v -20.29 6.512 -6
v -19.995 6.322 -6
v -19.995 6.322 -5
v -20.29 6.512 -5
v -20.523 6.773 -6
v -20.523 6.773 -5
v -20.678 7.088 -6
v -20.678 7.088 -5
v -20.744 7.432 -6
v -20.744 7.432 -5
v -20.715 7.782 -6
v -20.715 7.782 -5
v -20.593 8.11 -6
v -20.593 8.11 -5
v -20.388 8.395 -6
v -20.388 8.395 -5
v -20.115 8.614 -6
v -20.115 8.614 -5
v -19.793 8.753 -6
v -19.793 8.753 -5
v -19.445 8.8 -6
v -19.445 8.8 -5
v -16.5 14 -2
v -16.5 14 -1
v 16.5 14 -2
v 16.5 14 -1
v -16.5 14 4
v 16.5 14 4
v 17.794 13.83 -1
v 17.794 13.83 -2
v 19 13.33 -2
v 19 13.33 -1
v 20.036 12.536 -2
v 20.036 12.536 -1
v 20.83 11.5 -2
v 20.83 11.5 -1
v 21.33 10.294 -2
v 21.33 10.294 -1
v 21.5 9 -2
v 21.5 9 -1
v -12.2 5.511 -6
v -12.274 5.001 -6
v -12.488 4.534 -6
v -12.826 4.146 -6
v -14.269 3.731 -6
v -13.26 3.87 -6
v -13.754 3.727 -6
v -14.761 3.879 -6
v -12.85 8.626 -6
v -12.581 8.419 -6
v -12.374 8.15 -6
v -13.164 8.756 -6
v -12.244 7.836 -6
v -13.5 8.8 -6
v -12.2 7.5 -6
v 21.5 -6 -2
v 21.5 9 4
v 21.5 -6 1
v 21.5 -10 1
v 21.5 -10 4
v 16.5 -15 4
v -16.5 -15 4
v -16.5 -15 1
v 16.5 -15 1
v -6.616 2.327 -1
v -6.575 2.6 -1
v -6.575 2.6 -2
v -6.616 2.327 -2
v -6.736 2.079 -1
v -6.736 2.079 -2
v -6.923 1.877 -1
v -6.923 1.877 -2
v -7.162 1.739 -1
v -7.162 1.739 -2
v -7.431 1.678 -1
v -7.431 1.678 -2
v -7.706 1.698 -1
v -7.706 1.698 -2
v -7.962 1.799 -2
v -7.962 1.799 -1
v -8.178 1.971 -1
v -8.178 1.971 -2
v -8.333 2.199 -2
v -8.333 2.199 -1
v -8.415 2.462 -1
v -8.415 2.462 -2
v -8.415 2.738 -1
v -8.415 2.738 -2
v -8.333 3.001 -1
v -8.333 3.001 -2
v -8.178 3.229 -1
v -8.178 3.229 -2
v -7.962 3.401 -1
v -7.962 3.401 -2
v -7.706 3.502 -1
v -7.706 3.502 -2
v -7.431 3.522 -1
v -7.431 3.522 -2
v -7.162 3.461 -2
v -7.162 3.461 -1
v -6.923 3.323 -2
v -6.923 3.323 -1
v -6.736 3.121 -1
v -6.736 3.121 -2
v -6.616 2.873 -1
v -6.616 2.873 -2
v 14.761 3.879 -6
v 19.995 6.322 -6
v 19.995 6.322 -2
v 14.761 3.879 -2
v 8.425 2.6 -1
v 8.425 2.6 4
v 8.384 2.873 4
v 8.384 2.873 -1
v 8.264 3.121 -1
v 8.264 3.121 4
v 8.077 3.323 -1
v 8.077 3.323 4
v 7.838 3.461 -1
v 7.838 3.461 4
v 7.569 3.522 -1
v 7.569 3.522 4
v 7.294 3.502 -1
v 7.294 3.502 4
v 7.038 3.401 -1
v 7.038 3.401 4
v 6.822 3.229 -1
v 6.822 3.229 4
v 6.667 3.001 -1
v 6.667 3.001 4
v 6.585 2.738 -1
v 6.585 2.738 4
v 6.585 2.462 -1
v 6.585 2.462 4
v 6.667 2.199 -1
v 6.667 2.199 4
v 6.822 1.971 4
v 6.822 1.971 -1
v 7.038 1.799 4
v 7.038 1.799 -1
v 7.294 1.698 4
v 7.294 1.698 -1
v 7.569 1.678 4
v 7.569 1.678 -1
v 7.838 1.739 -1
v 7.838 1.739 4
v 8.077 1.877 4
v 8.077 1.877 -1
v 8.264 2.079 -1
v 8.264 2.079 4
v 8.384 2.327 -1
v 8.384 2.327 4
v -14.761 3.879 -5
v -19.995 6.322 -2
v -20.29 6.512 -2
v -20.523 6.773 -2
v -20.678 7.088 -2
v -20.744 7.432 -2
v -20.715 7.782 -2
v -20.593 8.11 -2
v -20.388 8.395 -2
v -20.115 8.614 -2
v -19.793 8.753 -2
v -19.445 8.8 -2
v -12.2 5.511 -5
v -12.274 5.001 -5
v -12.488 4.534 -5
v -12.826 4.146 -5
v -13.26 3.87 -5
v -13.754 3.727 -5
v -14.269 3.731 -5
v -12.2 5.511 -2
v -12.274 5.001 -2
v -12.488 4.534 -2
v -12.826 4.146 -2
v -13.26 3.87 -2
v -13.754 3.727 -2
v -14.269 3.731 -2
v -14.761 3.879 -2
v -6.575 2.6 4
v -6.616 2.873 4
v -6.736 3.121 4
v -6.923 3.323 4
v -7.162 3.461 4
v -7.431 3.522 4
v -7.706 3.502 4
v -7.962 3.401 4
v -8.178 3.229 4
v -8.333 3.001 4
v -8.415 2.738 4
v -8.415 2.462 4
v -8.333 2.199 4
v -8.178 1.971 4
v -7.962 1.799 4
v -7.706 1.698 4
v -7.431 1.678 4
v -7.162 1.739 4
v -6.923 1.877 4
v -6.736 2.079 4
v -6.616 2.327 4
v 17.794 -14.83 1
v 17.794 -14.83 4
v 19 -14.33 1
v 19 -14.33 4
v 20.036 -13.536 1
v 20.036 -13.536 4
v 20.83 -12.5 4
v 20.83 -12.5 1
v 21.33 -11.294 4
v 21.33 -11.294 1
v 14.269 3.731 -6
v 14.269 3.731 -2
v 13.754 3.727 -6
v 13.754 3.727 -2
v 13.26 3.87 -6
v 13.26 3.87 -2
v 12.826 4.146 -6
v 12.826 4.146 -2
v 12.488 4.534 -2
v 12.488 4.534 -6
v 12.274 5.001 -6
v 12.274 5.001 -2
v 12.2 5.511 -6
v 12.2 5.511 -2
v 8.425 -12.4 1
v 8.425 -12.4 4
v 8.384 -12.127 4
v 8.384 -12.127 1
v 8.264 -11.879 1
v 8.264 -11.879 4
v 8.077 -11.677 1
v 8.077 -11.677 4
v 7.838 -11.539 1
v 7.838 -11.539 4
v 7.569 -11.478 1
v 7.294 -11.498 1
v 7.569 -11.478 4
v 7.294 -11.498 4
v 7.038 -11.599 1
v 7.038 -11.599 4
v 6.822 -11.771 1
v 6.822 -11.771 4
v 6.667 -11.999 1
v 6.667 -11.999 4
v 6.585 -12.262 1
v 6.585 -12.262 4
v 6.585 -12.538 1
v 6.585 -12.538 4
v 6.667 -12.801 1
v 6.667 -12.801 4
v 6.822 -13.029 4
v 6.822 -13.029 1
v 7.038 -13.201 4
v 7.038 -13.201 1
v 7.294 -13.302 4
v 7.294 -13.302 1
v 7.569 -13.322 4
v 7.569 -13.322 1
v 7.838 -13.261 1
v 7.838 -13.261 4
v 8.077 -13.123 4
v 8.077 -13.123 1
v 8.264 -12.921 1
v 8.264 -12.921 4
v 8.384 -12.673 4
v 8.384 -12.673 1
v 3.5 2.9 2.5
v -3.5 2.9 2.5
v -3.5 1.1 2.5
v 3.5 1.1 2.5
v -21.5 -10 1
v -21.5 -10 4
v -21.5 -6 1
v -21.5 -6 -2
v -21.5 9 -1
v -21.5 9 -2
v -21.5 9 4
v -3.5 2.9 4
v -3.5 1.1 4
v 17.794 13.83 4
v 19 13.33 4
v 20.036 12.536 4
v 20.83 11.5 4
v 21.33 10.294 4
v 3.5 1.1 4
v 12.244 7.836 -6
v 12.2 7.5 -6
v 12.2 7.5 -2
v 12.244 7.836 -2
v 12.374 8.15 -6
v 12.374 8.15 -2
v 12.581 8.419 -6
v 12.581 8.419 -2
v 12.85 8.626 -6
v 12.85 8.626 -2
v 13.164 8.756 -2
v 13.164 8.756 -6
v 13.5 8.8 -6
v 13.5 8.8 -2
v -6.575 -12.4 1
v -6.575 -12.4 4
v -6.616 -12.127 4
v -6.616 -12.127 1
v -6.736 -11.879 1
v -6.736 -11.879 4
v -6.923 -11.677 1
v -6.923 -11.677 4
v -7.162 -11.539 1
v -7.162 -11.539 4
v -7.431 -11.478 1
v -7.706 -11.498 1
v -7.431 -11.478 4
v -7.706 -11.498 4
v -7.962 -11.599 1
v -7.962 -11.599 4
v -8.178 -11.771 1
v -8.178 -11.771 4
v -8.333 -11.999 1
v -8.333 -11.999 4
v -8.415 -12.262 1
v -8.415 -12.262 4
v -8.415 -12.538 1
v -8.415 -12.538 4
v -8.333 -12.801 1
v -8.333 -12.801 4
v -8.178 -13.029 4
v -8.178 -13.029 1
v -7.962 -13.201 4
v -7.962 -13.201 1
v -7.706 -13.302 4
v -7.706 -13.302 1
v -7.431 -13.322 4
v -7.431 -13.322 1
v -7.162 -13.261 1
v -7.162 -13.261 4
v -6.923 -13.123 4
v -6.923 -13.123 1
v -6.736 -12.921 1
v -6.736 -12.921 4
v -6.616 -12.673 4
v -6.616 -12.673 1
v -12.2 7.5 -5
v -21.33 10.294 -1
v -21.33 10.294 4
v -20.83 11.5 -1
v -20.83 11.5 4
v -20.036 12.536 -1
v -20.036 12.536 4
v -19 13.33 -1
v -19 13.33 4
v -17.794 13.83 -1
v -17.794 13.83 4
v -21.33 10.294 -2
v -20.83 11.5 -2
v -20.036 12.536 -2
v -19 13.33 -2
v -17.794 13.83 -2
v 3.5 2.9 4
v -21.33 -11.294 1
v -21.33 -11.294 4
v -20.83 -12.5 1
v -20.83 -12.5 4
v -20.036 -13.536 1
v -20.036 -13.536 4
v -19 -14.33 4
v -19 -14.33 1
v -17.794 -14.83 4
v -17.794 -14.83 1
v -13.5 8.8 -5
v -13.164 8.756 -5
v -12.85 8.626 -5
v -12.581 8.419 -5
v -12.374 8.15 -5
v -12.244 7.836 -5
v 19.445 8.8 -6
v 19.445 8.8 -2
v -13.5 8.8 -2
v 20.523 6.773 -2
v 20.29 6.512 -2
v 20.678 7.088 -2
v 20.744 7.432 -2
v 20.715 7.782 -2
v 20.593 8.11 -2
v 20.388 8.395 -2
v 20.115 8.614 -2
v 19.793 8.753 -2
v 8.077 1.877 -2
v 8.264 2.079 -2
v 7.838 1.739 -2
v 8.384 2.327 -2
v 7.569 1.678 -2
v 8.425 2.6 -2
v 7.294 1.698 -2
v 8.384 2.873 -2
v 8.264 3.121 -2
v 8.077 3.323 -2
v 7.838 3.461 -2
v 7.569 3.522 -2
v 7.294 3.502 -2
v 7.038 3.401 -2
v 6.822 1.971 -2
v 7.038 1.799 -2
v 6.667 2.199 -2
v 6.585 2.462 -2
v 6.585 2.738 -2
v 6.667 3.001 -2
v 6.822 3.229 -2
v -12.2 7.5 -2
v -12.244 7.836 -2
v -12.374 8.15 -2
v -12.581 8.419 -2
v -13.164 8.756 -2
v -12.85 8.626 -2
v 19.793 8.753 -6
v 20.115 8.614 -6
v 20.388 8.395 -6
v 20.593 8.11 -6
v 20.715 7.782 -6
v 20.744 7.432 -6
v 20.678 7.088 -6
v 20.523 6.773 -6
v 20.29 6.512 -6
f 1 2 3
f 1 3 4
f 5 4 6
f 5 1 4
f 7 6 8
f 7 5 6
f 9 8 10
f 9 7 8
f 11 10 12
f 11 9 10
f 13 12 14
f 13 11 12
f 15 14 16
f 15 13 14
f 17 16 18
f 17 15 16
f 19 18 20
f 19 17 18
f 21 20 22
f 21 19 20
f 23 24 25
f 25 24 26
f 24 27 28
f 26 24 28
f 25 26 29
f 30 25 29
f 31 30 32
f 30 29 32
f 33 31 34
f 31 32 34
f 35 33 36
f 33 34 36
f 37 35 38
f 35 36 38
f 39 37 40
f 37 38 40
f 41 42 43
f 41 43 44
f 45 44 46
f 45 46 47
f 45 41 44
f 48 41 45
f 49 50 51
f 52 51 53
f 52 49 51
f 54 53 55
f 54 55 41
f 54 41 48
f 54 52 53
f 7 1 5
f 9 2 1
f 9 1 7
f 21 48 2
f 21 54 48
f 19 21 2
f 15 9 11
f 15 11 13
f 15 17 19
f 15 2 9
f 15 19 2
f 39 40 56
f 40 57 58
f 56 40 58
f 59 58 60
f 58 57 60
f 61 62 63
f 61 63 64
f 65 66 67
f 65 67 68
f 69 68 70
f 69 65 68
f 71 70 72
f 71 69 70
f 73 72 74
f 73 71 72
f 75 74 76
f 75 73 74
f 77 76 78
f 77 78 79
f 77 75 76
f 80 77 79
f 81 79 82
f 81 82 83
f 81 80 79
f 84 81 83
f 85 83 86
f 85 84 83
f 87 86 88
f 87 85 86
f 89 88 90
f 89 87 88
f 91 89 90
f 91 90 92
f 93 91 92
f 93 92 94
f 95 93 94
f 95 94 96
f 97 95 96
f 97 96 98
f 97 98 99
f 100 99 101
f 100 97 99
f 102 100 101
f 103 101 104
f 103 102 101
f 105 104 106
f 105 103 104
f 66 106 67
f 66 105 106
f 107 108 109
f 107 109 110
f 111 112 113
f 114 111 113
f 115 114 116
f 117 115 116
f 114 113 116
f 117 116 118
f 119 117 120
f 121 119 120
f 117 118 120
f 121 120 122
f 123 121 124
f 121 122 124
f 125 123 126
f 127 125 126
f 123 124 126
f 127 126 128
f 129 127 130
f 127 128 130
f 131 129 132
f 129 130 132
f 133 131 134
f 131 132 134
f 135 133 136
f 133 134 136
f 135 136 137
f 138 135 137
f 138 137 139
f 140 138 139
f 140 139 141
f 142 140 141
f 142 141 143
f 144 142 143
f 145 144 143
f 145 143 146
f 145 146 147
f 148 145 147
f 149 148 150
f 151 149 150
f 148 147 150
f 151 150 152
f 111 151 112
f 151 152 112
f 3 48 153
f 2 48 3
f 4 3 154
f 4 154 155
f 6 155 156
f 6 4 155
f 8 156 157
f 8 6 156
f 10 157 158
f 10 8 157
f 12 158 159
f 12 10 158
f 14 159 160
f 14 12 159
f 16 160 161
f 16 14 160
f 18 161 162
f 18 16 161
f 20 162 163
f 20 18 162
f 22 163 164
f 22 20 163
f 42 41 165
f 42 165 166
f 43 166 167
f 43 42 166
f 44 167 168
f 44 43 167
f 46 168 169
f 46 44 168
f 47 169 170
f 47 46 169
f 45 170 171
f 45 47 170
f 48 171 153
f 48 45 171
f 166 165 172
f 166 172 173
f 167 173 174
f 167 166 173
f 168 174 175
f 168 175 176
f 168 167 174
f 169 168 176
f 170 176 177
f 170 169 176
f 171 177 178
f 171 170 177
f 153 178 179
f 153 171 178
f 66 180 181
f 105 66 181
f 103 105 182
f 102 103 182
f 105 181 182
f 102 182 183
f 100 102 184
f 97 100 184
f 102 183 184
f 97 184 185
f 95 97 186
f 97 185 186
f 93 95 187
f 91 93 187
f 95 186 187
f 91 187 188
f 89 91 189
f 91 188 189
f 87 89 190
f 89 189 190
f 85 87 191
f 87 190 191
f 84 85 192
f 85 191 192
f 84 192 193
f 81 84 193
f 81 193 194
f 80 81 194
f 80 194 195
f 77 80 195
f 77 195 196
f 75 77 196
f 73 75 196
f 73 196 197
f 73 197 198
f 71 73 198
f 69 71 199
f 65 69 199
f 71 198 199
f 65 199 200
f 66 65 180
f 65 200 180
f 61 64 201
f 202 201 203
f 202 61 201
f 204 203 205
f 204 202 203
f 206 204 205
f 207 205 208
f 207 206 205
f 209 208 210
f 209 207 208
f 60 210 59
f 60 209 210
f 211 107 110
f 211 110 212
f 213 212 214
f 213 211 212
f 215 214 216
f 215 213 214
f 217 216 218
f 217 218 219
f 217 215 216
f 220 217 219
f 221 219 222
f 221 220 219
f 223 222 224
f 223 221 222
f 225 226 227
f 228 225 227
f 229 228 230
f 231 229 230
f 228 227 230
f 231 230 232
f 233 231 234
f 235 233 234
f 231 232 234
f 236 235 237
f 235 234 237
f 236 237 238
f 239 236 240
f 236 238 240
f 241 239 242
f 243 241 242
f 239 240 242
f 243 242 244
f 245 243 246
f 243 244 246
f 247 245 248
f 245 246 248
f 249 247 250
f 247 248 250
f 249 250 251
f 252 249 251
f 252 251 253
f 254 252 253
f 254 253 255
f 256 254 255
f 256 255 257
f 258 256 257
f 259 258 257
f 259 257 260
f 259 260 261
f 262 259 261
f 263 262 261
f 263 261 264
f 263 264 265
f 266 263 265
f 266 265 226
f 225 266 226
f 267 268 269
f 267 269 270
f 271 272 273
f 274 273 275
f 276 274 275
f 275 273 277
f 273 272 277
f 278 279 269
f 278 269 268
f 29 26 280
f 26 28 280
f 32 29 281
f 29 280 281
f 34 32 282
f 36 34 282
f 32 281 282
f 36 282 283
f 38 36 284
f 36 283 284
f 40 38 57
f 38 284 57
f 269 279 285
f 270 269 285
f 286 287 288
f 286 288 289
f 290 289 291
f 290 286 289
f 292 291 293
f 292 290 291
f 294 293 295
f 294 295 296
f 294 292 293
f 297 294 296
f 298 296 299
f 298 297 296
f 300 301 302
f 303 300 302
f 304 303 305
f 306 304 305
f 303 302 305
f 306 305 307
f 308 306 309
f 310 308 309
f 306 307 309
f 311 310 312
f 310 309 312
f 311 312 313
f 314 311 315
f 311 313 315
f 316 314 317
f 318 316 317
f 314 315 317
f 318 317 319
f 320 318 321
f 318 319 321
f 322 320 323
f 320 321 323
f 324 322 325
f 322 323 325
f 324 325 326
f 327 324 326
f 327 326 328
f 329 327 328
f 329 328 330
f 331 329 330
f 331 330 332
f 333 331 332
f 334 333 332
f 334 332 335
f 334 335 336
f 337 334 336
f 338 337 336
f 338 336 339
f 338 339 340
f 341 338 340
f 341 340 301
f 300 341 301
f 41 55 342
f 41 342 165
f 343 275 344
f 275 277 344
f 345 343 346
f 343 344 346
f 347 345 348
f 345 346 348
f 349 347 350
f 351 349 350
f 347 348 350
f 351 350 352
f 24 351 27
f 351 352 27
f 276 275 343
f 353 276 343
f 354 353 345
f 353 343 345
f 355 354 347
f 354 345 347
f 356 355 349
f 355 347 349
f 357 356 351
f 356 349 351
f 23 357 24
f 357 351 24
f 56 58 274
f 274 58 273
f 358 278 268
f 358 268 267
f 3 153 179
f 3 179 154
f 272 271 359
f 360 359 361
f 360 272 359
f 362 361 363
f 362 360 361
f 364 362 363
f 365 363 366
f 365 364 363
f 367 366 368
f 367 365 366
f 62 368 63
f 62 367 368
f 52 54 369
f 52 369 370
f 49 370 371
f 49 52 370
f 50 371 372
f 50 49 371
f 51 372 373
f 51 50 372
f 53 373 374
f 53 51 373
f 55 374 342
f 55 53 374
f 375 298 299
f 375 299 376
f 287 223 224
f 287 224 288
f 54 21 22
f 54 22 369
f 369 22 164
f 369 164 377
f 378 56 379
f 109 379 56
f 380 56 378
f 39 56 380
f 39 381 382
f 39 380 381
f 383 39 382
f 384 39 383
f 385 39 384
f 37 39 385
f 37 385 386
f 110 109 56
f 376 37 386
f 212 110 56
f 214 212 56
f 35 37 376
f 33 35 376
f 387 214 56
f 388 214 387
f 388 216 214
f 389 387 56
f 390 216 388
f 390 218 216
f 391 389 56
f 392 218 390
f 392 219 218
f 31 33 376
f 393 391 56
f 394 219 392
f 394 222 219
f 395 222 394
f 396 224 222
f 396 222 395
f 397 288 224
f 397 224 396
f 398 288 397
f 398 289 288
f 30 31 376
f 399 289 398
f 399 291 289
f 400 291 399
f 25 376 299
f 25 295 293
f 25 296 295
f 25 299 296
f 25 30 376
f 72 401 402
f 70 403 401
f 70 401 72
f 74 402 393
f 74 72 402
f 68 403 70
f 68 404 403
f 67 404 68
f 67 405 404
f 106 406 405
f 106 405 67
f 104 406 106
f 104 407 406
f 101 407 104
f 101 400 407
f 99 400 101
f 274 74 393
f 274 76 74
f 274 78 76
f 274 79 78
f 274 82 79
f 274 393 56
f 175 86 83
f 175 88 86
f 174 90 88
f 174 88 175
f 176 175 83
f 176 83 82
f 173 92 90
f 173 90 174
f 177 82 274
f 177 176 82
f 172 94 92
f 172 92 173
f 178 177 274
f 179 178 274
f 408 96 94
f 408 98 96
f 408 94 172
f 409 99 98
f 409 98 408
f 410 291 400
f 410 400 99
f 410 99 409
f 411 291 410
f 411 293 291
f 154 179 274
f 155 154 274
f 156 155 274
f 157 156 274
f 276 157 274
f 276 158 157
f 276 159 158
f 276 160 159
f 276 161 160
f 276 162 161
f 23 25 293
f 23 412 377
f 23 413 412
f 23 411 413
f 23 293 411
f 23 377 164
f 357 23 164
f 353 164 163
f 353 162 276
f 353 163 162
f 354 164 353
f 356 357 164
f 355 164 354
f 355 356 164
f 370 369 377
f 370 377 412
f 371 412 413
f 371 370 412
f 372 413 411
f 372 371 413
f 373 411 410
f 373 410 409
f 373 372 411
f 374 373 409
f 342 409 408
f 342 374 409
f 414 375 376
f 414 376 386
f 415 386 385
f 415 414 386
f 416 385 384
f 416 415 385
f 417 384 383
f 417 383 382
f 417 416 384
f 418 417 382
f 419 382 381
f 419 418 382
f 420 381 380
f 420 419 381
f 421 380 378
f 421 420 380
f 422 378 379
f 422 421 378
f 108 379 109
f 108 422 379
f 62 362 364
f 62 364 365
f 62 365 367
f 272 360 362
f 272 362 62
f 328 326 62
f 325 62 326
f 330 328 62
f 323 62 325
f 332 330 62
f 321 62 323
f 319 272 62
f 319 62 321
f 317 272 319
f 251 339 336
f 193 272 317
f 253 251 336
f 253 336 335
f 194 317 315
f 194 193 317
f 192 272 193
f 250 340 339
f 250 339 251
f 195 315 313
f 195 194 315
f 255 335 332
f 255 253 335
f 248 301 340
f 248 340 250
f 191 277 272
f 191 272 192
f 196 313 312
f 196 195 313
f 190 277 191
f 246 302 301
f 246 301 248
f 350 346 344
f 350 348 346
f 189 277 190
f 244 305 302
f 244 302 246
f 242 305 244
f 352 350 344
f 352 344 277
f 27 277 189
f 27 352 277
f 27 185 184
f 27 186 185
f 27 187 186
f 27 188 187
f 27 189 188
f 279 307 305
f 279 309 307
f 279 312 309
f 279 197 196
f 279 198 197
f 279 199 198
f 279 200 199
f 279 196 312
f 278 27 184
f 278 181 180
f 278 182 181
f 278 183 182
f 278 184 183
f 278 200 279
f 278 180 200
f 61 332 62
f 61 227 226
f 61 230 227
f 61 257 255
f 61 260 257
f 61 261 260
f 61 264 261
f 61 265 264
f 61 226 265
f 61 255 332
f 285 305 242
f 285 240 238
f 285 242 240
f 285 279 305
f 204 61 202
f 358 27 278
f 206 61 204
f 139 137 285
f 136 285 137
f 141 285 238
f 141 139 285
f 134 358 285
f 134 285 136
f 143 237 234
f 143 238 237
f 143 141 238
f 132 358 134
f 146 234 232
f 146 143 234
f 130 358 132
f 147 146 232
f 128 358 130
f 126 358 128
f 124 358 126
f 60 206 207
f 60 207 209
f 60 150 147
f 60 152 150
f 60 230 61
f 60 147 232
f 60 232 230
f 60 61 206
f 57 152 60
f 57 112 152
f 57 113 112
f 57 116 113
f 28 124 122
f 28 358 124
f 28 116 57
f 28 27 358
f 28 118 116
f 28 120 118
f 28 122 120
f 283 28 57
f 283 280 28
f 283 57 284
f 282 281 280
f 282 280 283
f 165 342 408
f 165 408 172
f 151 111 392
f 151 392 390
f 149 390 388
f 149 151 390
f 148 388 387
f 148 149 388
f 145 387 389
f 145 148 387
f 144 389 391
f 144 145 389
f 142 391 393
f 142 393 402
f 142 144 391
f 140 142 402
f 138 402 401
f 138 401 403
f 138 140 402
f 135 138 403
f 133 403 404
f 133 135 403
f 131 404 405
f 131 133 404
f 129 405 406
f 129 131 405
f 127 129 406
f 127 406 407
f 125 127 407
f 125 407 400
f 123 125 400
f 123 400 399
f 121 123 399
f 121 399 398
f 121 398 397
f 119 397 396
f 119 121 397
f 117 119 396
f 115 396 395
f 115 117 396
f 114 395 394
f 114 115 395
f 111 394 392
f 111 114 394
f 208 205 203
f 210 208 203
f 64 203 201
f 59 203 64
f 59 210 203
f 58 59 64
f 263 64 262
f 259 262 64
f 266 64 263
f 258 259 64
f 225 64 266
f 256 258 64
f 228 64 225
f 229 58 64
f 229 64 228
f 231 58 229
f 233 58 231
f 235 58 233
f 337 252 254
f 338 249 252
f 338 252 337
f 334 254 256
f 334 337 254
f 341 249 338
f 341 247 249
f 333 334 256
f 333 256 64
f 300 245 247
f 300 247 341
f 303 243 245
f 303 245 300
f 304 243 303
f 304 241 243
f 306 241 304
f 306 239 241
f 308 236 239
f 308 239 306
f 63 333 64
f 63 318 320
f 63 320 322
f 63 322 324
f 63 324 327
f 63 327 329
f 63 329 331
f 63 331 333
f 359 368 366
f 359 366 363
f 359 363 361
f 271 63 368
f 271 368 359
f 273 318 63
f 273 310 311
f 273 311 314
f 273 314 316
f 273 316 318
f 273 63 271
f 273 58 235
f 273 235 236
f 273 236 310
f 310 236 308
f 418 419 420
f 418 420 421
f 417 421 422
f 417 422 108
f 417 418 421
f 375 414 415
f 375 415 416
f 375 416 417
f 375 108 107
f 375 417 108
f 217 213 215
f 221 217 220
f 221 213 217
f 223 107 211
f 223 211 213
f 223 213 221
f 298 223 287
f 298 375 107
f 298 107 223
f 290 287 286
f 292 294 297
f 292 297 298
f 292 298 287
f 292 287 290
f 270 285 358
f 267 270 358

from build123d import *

# Parameters (mm, degrees)
SKETCH_1_W           = 27
SKETCH_1_H           = 20
EXTRUDE_1_DEPTH      = 4
SKETCH_2_W           = 6.8
SKETCH_2_H           = 1.6
CUT_EXTRUDE_1_DEPTH  = 1.5
EXTRUDE_2_DEPTH      = 3
SKETCH_5_W           = 27
SKETCH_5_H           = 4
EXTRUDE_3_DEPTH      = 4
SKETCH_9_W           = 27
SKETCH_9_H           = 20
CUT_EXTRUDE_4_DEPTH  = 2
EXTRUDE_6_DEPTH      = 8
EXTRUDE_7_DEPTH      = 8
SKETCH_12_W          = 43
SKETCH_12_H          = 16
EXTRUDE_8_DEPTH      = 20
SKETCH_13_W          = 43
SKETCH_13_H          = 16
CUT_EXTRUDE_5_DEPTH  = 20
CUT_EXTRUDE_6_DEPTH  = 16
SKETCH_17_W          = 7
SKETCH_17_H          = 1.8
CUT_EXTRUDE_8_DEPTH  = 1.5
SKETCH_18_W          = 43
SKETCH_18_H          = 4
EXTRUDE_9_DEPTH      = 5
SKETCH_19_R          = 0.925
CUT_EXTRUDE_9_DEPTH  = 5
SKETCH_20_W          = 7
SKETCH_20_H          = 1.8
CUT_EXTRUDE_10_DEPTH = 1.5
SKETCH_21_W          = 7
SKETCH_21_H          = 1.8
EXTRUDE_10_DEPTH     = 1.5
FILLET_2_R           = 5
EXTRUDE_11_DEPTH     = 4
EXTRUDE_12_DEPTH     = 4
CUT_EXTRUDE_11_DEPTH = 1
SKETCH_25_R          = 0.925
EXTRUDE_13_DEPTH     = 1
EXTRUDE_START        = 1
EXTRUDE_14_DEPTH     = 1


with BuildPart() as part:
    # 草图1 → 凸台-拉伸1 (new body)
    with BuildSketch(Plane.XY):
        Rectangle(SKETCH_1_W, SKETCH_1_H)
    extrude(amount=EXTRUDE_1_DEPTH)

    # 草图2 → 切除-拉伸1 (cut)
    with BuildSketch(Plane(origin=(6.414908285, -0.597250082, 4), x_dir=(1, 0, 0), z_dir=(0, 0, 1))):
        with Locations((-6.414908285, 7.597250082)):
            Rectangle(SKETCH_2_W, SKETCH_2_H)
    extrude(amount=-CUT_EXTRUDE_1_DEPTH, mode=Mode.SUBTRACT)

    # 草图4 → 凸台-拉伸2 (add)
    with BuildSketch(Plane(origin=(0, 0, 0), x_dir=(-1, 0, 0), z_dir=(0, 0, -1))):
        Polygon((-13.5, 10), (-13.5, 14), (13.5, 14), (13.5, 10), (13.5, -6), (-13.5, -6), align=None)
    extrude(amount=EXTRUDE_2_DEPTH)

    # 草图5 → 凸台-拉伸3 (add)
    with BuildSketch(Plane(origin=(0, 10, 0), x_dir=(1, 0, 0), z_dir=(0, 1, 0))):
        with Locations((0, -2)):
            Rectangle(SKETCH_5_W, SKETCH_5_H)
    extrude(amount=EXTRUDE_3_DEPTH)

    # 草图9 → 切除-拉伸4 (cut)
    with BuildSketch(Plane(origin=(0, 0, -3), x_dir=(-1, 0, 0), z_dir=(0, 0, -1))):
        with Locations((0, 4)):
            Rectangle(SKETCH_9_W, SKETCH_9_H)
    extrude(amount=-CUT_EXTRUDE_4_DEPTH, mode=Mode.SUBTRACT)

    # 草图10 → 凸台-拉伸6 (add)
    with BuildSketch(Plane.ZY.offset(13.5)):
        Polygon((-1, 14), (-1, -6), (0, -6), (0, -10), (4, -10), (4, 14), align=None)
    extrude(amount=EXTRUDE_6_DEPTH)

    # 草图11 → 凸台-拉伸7 (add)
    with BuildSketch(Plane(origin=(13.5, 0, 0), x_dir=(0, 0, -1), z_dir=(1, 0, 0))):
        Polygon((1, -6), (1, 14), (-4, 14), (-4, -10), (0, -10), (0, -6), align=None)
    extrude(amount=EXTRUDE_7_DEPTH)

    # 草图12 → 凸台-拉伸8 (add)
    with BuildSketch(Plane(origin=(0, 0, -1), x_dir=(-1, 0, 0), z_dir=(0, 0, -1))):
        with Locations((0, 6)):
            Rectangle(SKETCH_12_W, SKETCH_12_H)
    extrude(amount=EXTRUDE_8_DEPTH)

    # 草图13 → 切除-拉伸5 (cut)
    with BuildSketch(Plane(origin=(6.414908285, -0.597250082, -21), x_dir=(-1, 0, 0), z_dir=(0, 0, -1))):
        with Locations((6.414908285, 6.597250082)):
            Rectangle(SKETCH_13_W, SKETCH_13_H)
        with BuildLine():
            Line((26.283170409, 7.191066942), (21.049236483, 4.748564443))
            ThreePointArc((21.049236483, 4.748564443), (19.609145385, 4.842633182), (18.914908285, 6.107839153))
            Line((18.914908285, 6.107839153), (18.914908285, 8.097250082))
            ThreePointArc((18.914908285, 8.097250082), (19.207801504, 8.804356863), (19.914908285, 9.097250082))
            Line((19.914908285, 9.097250082), (25.860284943, 9.097250082))
            ThreePointArc((25.860284943, 9.097250082), (26.836549031, 8.313833622), (26.283170409, 7.191066942))
        make_face(mode=Mode.SUBTRACT)
        with BuildLine():
            Line((-13.453353838, 7.191066942), (-8.219419913, 4.748564443))
            ThreePointArc((-8.219419913, 4.748564443), (-6.779328815, 4.842633182), (-6.085091715, 6.107839153))
            Line((-6.085091715, 6.107839153), (-6.085091715, 8.097250082))
            ThreePointArc((-6.085091715, 8.097250082), (-6.377984934, 8.804356863), (-7.085091715, 9.097250082))
            Line((-7.085091715, 9.097250082), (-13.030468373, 9.097250082))
            ThreePointArc((-13.030468373, 9.097250082), (-14.006732461, 8.313833622), (-13.453353838, 7.191066942))
        make_face(mode=Mode.SUBTRACT)
    extrude(amount=-CUT_EXTRUDE_5_DEPTH, mode=Mode.SUBTRACT)

    # 草图14 → 切除-拉伸6 (cut)
    with BuildSketch(Plane(origin=(6.414908285, -0.597250082, -21), x_dir=(-1, 0, 0), z_dir=(0, 0, -1))):
        with BuildLine():
            Line((21.049236483, 4.748564443), (26.283170409, 7.191066942))
            ThreePointArc((26.283170409, 7.191066942), (26.836549031, 8.313833622), (25.860284943, 9.097250082))
            Line((25.860284943, 9.097250082), (19.914908285, 9.097250082))
            ThreePointArc((19.914908285, 9.097250082), (19.207801504, 8.804356863), (18.914908285, 8.097250082))
            Line((18.914908285, 8.097250082), (18.914908285, 6.107839153))
            ThreePointArc((18.914908285, 6.107839153), (19.609145385, 4.842633182), (21.049236483, 4.748564443))
        make_face()
        with BuildLine():
            Line((-7.085091715, 9.097250082), (-13.030468373, 9.097250082))
            ThreePointArc((-13.030468373, 9.097250082), (-14.006732461, 8.313833622), (-13.453353838, 7.191066942))
            Line((-13.453353838, 7.191066942), (-8.219419913, 4.748564443))
            ThreePointArc((-8.219419913, 4.748564443), (-6.779328815, 4.842633182), (-6.085091715, 6.107839153))
            Line((-6.085091715, 6.107839153), (-6.085091715, 8.097250082))
            ThreePointArc((-6.085091715, 8.097250082), (-6.377984934, 8.804356863), (-7.085091715, 9.097250082))
        make_face()
    extrude(amount=-CUT_EXTRUDE_6_DEPTH, mode=Mode.SUBTRACT)

    # 草图17 → 切除-拉伸8 (cut)
    with BuildSketch(Plane.XY.offset(4)):
        with Locations((0, 7)):
            Rectangle(SKETCH_17_W, SKETCH_17_H)
    extrude(amount=-CUT_EXTRUDE_8_DEPTH, mode=Mode.SUBTRACT)

    # 草图18 → 凸台-拉伸9 (add)
    with BuildSketch(Plane.XZ.offset(10)):
        with Locations((0, 2)):
            Rectangle(SKETCH_18_W, SKETCH_18_H)
    extrude(amount=EXTRUDE_9_DEPTH)

    # 草图19 → 切除-拉伸9 (cut)
    with BuildSketch(Plane.XY.offset(4)):
        with Locations((-7.5, 2.6)):
            Circle(SKETCH_19_R)
        with Locations((7.5, 2.6)):
            Circle(SKETCH_19_R)
        with Locations((7.5, -12.4)):
            Circle(SKETCH_19_R)
        with Locations((-7.5, -12.4)):
            Circle(SKETCH_19_R)
    extrude(amount=-CUT_EXTRUDE_9_DEPTH, mode=Mode.SUBTRACT)

    # 草图20 → 切除-拉伸10 (cut)
    with BuildSketch(Plane.XY.offset(4)):
        with Locations((0, 2)):
            Rectangle(SKETCH_20_W, SKETCH_20_H)
    extrude(amount=-CUT_EXTRUDE_10_DEPTH, mode=Mode.SUBTRACT)

    # 草图21 → 凸台-拉伸10 (add)
    with BuildSketch(Plane.XY.offset(4)):
        with Locations((0, 7)):
            Rectangle(SKETCH_21_W, SKETCH_21_H)
    extrude(amount=-EXTRUDE_10_DEPTH)

    # 圆角2
    fillet_2_edges = [part.edges().sort_by_distance(p)[0] for p in [
        (21.5, 14, 1.5),
        (-21.5, -15, 2),
        (21.5, -15, 2),
        (-21.5, 14, 1.5),
    ]]
    fillet(fillet_2_edges, radius=FILLET_2_R)

    # 草图22 → 凸台-拉伸11 (add)
    # profile 1 of 2: a face of its own
    with BuildSketch(Plane(origin=(0, 0, -5), x_dir=(-1, 0, 0), z_dir=(0, 0, -1))):
        with BuildLine():
            Line((-13.5, 8.6), (-19.445376658, 8.6))
            ThreePointArc((-19.445376658, 8.6), (-20.519267155, 7.738241895), (-19.91055067, 6.503198546))
            Line((-19.91055067, 6.503198546), (-14.676616745, 4.060696047))
            ThreePointArc((-14.676616745, 4.060696047), (-13.140519573, 4.161036036), (-12.4, 5.510589071))
            Line((-12.4, 5.510589071), (-12.4, 7.5))
            ThreePointArc((-12.4, 7.5), (-12.722182541, 8.277817459), (-13.5, 8.6))
        make_face()
        with BuildLine():
            Line((-13.5, 8.5), (-19.445376658, 8.5))
            ThreePointArc((-19.445376658, 8.5), (-20.421640746, 7.71658354), (-19.868262123, 6.59381686))
            Line((-19.868262123, 6.59381686), (-14.634328198, 4.151314361))
            ThreePointArc((-14.634328198, 4.151314361), (-13.1942371, 4.245383101), (-12.5, 5.510589071))
            Line((-12.5, 5.510589071), (-12.5, 7.5))
            ThreePointArc((-12.5, 7.5), (-12.792893219, 8.207106781), (-13.5, 8.5))
        make_face(mode=Mode.SUBTRACT)
    # profile 2 of 2: a face of its own
    with BuildSketch(Plane(origin=(0, 0, -5), x_dir=(-1, 0, 0), z_dir=(0, 0, -1))):
        with BuildLine():
            Line((19.445376658, 8.6), (13.5, 8.6))
            ThreePointArc((13.5, 8.6), (12.722182541, 8.277817459), (12.4, 7.5))
            Line((12.4, 7.5), (12.4, 5.510589071))
            ThreePointArc((12.4, 5.510589071), (13.140519573, 4.161036036), (14.676616745, 4.060696047))
            Line((14.676616745, 4.060696047), (19.91055067, 6.503198546))
            ThreePointArc((19.91055067, 6.503198546), (20.519267155, 7.738241895), (19.445376658, 8.6))
        make_face()
        with BuildLine():
            Line((14.634328198, 4.151314361), (19.868262123, 6.59381686))
            ThreePointArc((19.868262123, 6.59381686), (20.421640746, 7.71658354), (19.445376658, 8.5))
            Line((19.445376658, 8.5), (13.5, 8.5))
            ThreePointArc((13.5, 8.5), (12.792893219, 8.207106781), (12.5, 7.5))
            Line((12.5, 7.5), (12.5, 5.510589071))
            ThreePointArc((12.5, 5.510589071), (13.1942371, 4.245383101), (14.634328198, 4.151314361))
        make_face(mode=Mode.SUBTRACT)
    extrude(amount=-EXTRUDE_11_DEPTH)

    # 草图23 → 凸台-拉伸12 (add)
    # profile 1 of 2: a face of its own
    with BuildSketch(Plane(origin=(0, 0, -5), x_dir=(-1, 0, 0), z_dir=(0, 0, -1))):
        with BuildLine():
            Line((-13.5, 8.8), (-19.445376658, 8.8))
            ThreePointArc((-19.445376658, 8.8), (-20.714519973, 7.781558603), (-19.995127763, 6.321961918))
            Line((-19.995127763, 6.321961918), (-14.761193838, 3.879459419))
            ThreePointArc((-14.761193838, 3.879459419), (-13.03308452, 3.992341907), (-12.2, 5.510589071))
            Line((-12.2, 5.510589071), (-12.2, 7.5))
            ThreePointArc((-12.2, 7.5), (-12.580761184, 8.419238816), (-13.5, 8.8))
        make_face()
        with BuildLine():
            Line((-13.5, 8.6), (-19.445376658, 8.6))
            ThreePointArc((-19.445376658, 8.6), (-20.519267155, 7.738241895), (-19.91055067, 6.503198546))
            Line((-19.91055067, 6.503198546), (-14.676616745, 4.060696047))
            ThreePointArc((-14.676616745, 4.060696047), (-13.140519573, 4.161036036), (-12.4, 5.510589071))
            Line((-12.4, 5.510589071), (-12.4, 7.5))
            ThreePointArc((-12.4, 7.5), (-12.722182541, 8.277817459), (-13.5, 8.6))
        make_face(mode=Mode.SUBTRACT)
    # profile 2 of 2: a face of its own
    with BuildSketch(Plane(origin=(0, 0, -5), x_dir=(-1, 0, 0), z_dir=(0, 0, -1))):
        with BuildLine():
            Line((19.445376658, 8.8), (13.5, 8.8))
            ThreePointArc((13.5, 8.8), (12.580761184, 8.419238816), (12.2, 7.5))
            Line((12.2, 7.5), (12.2, 5.510589071))
            ThreePointArc((12.2, 5.510589071), (13.03308452, 3.992341907), (14.761193838, 3.879459419))
            Line((14.761193838, 3.879459419), (19.995127763, 6.321961918))
            ThreePointArc((19.995127763, 6.321961918), (20.714519973, 7.781558603), (19.445376658, 8.8))
        make_face()
        with BuildLine():
            Line((19.445376658, 8.6), (13.5, 8.6))
            ThreePointArc((13.5, 8.6), (12.722182541, 8.277817459), (12.4, 7.5))
            Line((12.4, 7.5), (12.4, 5.510589071))
            ThreePointArc((12.4, 5.510589071), (13.140519573, 4.161036036), (14.676616745, 4.060696047))
            Line((14.676616745, 4.060696047), (19.91055067, 6.503198546))
            ThreePointArc((19.91055067, 6.503198546), (20.519267155, 7.738241895), (19.445376658, 8.6))
        make_face(mode=Mode.SUBTRACT)
    extrude(amount=-EXTRUDE_12_DEPTH)

    # 草图24 → 切除-拉伸11 (cut)
    with BuildSketch(Plane(origin=(0, 0, 0), x_dir=(-1, 0, 0), z_dir=(0, 0, -1))):
        with BuildLine():
            Line((-21.5, -6), (-21.5, -10))
            ThreePointArc((-21.5, -10), (-20.035533906, -13.535533906), (-16.5, -15))
            Line((-16.5, -15), (16.5, -15))
            ThreePointArc((16.5, -15), (20.035533906, -13.535533906), (21.5, -10))
            Line((21.5, -10), (21.5, -6))
            Line((21.5, -6), (-21.5, -6))
        make_face()
    extrude(amount=-CUT_EXTRUDE_11_DEPTH, mode=Mode.SUBTRACT)

    # 草图25 → 凸台-拉伸13 (add)
    with BuildSketch(Plane(origin=(0, 0, -1), x_dir=(-1, 0, 0), z_dir=(0, 0, -1))):
        with BuildLine():
            Line((16.5, 14), (-16.5, 14))
            ThreePointArc((-16.5, 14), (-20.035533906, 12.535533906), (-21.5, 9))
            Line((-21.5, 9), (-21.5, -6))
            Line((-21.5, -6), (21.5, -6))
            Line((21.5, -6), (21.5, 9))
            ThreePointArc((21.5, 9), (20.035533906, 12.535533906), (16.5, 14))
        make_face()
        with Locations(Location((-7.5, 2.6, 0), (0, 0, 180))):
            Circle(SKETCH_25_R, mode=Mode.SUBTRACT)
        with Locations(Location((7.5, 2.6, 0), (0, 0, 180))):
            Circle(SKETCH_25_R, mode=Mode.SUBTRACT)
    extrude(amount=EXTRUDE_13_DEPTH)

    # 草图26 → 凸台-拉伸14 (add)
    with BuildSketch(Plane(origin=(0, 0, -5), x_dir=(-1, 0, 0), z_dir=(0, 0, -1)).offset(EXTRUDE_START)):
        with BuildLine():
            Line((-13.5, 8.8), (-19.445376658, 8.8))
            ThreePointArc((-19.445376658, 8.8), (-20.714519973, 7.781558603), (-19.995127763, 6.321961918))
            Line((-19.995127763, 6.321961918), (-14.761193838, 3.879459419))
            ThreePointArc((-14.761193838, 3.879459419), (-13.03308452, 3.992341907), (-12.2, 5.510589071))
            Line((-12.2, 5.510589071), (-12.2, 7.5))
            ThreePointArc((-12.2, 7.5), (-12.580761184, 8.419238816), (-13.5, 8.8))
        make_face()
        with BuildLine():
            Line((19.445376658, 8.8), (13.5, 8.8))
            ThreePointArc((13.5, 8.8), (12.580761184, 8.419238816), (12.2, 7.5))
            Line((12.2, 7.5), (12.2, 5.510589071))
            ThreePointArc((12.2, 5.510589071), (13.03308452, 3.992341907), (14.761193838, 3.879459419))
            Line((14.761193838, 3.879459419), (19.995127763, 6.321961918))
            ThreePointArc((19.995127763, 6.321961918), (20.714519973, 7.781558603), (19.445376658, 8.8))
        make_face()
    extrude(amount=-EXTRUDE_14_DEPTH)


solid = part.part
